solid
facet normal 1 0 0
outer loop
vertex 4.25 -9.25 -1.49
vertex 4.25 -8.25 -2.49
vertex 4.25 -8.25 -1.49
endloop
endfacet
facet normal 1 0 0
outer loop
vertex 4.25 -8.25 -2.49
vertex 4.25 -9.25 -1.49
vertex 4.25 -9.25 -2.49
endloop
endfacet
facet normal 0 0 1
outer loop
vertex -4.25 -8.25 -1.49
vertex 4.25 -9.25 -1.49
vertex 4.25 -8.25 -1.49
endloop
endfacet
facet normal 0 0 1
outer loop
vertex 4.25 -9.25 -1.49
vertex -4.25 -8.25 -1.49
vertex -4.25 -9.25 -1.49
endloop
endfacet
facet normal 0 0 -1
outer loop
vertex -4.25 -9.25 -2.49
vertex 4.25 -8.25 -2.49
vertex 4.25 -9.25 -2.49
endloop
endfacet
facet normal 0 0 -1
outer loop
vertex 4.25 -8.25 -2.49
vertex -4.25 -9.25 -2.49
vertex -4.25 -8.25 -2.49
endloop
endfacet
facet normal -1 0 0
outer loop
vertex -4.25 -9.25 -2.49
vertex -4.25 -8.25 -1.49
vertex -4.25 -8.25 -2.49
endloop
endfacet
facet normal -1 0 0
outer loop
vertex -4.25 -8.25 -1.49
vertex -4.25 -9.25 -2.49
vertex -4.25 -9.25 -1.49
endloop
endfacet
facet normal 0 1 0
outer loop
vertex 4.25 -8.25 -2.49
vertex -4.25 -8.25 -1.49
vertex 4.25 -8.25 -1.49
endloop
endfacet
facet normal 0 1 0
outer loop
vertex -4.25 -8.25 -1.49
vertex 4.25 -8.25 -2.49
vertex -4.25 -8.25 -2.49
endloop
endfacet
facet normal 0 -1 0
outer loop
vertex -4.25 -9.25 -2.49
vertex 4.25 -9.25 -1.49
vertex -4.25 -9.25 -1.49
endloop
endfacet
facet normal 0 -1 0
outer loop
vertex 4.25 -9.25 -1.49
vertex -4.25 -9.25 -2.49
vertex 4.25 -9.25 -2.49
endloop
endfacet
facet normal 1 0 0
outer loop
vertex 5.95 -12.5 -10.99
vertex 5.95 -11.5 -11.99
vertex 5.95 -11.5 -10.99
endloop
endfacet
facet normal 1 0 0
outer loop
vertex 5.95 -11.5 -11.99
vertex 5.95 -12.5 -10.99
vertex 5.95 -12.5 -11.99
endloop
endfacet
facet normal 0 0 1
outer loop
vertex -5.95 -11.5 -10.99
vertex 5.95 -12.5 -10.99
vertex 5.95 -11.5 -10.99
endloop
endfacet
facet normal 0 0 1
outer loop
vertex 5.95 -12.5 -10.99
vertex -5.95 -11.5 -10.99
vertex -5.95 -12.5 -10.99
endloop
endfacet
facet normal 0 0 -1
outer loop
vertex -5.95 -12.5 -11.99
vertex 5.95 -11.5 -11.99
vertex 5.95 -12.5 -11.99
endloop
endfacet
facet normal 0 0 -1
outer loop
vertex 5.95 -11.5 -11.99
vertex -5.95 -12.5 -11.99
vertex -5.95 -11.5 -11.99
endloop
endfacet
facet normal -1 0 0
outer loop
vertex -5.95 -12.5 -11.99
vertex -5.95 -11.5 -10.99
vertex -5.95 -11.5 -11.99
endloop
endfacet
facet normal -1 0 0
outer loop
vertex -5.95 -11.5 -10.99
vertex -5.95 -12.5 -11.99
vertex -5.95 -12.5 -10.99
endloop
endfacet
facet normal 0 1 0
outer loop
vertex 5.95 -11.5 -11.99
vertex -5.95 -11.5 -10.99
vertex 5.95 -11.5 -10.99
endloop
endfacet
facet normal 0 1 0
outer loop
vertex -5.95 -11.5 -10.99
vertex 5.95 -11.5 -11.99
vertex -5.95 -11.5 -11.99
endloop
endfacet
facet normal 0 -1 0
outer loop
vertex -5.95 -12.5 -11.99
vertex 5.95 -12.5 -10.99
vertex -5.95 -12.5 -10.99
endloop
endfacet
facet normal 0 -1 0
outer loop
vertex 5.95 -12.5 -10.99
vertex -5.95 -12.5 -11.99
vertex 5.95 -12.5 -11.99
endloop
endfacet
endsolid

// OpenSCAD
group() {
										multmatrix([[1, 0, 0, 0], [0, 1, 0, -8.75], [0, 0, 1, -1.99], [0, 0, 0, 1]]) {
											cube(size = [8.5, 1, 1], center = true);
										}
										multmatrix([[1, 0, 0, 0], [0, 1, 0, -12], [0, 0, 1, -11.49], [0, 0, 0, 1]]) {
											cube(size = [11.9, 1, 1], center = true);
										}
									}
